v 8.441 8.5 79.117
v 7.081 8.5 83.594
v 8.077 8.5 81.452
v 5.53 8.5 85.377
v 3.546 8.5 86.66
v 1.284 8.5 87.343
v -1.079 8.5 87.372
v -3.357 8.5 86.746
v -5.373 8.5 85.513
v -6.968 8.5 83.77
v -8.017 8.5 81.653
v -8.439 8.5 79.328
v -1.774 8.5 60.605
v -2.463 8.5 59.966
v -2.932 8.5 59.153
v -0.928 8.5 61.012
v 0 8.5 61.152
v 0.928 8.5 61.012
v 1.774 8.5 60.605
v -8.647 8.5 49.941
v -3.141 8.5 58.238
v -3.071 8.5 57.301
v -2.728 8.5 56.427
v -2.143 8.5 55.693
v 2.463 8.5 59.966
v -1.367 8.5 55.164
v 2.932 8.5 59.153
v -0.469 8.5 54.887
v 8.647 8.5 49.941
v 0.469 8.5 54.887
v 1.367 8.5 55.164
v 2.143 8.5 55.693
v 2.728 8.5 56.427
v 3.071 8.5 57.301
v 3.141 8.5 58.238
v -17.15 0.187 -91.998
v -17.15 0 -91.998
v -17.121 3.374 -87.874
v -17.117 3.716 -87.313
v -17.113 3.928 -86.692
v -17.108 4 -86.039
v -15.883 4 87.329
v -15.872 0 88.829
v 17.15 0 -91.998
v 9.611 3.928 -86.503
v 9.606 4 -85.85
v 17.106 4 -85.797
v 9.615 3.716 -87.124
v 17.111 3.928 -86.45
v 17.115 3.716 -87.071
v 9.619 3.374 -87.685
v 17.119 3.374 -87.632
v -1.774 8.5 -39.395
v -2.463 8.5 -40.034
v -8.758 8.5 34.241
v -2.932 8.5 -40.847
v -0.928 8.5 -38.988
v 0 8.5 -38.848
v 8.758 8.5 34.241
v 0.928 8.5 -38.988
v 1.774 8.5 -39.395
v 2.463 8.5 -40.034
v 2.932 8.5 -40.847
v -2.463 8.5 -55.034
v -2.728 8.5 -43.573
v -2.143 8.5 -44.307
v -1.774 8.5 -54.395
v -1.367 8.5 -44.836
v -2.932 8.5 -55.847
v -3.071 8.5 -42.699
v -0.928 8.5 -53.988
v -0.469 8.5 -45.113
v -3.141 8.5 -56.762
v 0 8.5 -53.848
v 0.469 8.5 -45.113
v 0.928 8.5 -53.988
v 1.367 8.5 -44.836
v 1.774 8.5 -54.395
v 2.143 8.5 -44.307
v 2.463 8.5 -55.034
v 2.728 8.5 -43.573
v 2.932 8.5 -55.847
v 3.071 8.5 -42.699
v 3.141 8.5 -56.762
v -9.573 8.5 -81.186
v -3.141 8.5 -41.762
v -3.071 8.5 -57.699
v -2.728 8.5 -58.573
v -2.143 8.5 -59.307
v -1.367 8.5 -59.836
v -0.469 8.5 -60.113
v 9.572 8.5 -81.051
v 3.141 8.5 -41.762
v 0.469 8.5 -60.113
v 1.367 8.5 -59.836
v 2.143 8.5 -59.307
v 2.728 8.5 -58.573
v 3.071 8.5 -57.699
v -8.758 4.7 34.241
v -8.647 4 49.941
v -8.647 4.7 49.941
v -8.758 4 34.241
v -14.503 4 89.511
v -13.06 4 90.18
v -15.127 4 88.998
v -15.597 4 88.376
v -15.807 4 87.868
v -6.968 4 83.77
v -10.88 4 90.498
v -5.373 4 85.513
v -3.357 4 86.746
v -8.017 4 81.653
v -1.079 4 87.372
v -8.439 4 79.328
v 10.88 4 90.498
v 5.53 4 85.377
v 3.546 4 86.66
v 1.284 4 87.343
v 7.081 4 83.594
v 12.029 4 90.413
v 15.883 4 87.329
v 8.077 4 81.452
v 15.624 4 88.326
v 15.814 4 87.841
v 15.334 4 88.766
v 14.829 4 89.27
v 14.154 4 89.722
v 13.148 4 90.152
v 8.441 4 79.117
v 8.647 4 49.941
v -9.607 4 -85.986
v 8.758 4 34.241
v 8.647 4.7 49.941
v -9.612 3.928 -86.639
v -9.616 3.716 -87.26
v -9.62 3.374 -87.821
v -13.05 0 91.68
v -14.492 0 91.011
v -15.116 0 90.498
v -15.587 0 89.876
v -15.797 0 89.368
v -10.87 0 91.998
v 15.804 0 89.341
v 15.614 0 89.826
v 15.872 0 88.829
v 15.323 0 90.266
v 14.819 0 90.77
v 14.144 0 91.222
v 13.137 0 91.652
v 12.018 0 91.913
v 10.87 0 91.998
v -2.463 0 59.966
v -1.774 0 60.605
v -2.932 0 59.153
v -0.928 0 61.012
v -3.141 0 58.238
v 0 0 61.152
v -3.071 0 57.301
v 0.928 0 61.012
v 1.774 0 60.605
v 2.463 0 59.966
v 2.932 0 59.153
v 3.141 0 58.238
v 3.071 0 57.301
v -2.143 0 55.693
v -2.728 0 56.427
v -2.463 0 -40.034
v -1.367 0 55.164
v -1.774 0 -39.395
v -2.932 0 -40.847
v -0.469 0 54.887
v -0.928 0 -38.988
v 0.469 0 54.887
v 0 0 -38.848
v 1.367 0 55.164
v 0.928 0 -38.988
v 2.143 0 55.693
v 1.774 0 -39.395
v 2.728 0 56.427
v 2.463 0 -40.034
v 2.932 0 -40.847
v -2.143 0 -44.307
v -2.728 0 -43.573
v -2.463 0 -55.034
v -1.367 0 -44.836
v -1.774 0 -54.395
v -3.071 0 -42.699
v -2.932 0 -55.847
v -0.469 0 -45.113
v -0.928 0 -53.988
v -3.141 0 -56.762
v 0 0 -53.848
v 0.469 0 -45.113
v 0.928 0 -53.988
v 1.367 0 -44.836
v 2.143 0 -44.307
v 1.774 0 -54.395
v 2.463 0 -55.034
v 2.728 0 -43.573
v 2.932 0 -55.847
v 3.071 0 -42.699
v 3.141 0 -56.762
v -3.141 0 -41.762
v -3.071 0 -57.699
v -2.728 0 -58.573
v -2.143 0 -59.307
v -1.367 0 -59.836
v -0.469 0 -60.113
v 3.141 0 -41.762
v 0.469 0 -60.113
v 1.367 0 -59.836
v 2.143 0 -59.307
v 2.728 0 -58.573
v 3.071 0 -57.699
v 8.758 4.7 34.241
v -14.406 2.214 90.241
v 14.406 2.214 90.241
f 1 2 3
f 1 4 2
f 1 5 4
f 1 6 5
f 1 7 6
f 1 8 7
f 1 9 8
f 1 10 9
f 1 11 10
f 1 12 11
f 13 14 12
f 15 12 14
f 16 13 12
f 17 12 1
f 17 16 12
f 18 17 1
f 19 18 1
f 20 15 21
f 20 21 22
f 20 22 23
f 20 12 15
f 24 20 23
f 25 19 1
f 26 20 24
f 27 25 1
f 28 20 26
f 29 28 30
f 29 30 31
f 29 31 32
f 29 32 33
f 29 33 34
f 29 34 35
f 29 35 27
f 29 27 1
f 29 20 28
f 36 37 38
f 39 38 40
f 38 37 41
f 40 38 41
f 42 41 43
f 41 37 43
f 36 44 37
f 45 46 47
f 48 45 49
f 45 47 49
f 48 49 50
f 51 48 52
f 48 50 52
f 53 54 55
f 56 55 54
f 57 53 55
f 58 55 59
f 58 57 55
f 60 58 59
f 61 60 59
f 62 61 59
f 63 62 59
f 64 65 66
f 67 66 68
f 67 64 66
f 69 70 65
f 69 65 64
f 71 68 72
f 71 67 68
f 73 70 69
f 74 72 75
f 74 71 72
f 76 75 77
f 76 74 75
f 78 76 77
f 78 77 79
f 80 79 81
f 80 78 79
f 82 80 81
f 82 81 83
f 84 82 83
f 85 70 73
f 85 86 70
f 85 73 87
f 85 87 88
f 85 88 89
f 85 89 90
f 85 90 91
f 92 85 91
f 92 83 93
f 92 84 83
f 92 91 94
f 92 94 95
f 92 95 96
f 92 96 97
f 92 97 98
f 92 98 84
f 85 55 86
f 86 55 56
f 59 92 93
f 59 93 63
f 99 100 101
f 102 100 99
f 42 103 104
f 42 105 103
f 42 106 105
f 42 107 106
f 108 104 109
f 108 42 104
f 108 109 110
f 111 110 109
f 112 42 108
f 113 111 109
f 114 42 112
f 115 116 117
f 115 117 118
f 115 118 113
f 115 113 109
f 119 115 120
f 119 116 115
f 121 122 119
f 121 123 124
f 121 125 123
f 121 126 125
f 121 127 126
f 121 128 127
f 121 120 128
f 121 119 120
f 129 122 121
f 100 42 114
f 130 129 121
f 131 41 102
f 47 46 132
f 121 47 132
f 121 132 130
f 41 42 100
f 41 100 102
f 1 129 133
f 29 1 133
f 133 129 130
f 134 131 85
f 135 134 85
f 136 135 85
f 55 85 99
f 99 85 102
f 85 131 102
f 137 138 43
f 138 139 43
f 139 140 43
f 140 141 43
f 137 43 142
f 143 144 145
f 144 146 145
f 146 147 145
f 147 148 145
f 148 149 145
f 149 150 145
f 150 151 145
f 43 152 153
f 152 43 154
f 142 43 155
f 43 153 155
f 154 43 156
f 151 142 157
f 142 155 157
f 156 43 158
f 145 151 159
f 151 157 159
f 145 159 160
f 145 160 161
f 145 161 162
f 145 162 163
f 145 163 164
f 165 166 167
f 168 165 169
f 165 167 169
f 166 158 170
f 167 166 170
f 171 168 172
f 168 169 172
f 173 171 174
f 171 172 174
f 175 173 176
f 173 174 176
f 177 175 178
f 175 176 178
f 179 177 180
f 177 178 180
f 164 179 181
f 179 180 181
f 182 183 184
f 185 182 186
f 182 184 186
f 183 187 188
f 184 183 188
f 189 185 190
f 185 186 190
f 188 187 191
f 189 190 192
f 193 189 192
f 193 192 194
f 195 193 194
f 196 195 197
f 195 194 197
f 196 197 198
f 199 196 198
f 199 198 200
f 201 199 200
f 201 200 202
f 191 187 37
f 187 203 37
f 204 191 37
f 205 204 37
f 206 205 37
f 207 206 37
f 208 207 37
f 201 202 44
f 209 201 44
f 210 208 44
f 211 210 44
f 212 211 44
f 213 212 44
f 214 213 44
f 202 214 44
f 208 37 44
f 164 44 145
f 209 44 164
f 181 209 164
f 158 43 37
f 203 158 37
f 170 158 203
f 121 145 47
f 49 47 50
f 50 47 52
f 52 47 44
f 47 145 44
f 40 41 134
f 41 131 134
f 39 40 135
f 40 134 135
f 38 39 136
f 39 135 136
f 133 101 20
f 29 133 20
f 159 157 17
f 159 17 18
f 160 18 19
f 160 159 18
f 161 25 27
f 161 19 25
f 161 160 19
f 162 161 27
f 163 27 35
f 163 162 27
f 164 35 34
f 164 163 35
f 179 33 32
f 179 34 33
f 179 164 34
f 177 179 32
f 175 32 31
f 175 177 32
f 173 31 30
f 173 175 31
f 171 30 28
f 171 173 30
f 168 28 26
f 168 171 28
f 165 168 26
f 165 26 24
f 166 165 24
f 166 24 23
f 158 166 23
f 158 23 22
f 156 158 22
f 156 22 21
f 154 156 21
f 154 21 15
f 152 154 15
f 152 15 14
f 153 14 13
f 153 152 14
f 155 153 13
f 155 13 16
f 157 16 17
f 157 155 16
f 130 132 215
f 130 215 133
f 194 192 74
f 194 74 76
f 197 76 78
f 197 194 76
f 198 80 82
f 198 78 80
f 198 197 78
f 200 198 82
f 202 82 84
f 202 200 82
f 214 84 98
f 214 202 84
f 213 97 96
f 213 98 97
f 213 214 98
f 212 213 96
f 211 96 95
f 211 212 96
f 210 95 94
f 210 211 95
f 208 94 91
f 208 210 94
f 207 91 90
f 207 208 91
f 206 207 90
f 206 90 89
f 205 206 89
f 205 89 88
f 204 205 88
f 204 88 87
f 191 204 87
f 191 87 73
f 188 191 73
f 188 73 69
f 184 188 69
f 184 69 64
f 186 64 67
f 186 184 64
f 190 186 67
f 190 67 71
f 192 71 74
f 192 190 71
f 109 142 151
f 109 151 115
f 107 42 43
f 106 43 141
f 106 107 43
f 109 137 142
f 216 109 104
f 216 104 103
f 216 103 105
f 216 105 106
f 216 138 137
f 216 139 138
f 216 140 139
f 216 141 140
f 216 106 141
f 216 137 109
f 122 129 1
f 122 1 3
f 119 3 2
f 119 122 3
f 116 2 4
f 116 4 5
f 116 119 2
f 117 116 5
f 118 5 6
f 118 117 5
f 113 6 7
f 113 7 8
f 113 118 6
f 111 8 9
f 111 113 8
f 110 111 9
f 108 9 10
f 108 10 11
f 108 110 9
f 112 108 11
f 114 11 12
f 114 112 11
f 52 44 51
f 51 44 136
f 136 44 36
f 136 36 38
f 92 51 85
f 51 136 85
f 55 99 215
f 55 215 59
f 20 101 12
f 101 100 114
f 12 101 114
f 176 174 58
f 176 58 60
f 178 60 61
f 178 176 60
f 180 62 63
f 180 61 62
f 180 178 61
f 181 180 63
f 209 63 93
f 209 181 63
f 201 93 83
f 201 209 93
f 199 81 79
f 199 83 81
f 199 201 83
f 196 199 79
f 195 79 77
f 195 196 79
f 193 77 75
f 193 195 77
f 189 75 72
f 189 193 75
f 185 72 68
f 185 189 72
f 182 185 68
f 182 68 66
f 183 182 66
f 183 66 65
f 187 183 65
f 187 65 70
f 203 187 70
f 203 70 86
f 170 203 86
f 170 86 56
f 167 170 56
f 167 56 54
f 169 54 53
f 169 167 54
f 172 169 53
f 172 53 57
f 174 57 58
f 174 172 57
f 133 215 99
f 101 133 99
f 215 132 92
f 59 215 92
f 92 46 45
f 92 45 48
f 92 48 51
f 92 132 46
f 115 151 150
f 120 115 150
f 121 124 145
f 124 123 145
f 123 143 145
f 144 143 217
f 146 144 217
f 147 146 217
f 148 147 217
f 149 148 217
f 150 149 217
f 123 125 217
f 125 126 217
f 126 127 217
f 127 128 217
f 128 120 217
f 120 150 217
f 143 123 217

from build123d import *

# Parameters (mm, degrees)
BOSS_EXTRUDE1_DEPTH     = 4
BOSS_EXTRUDE2_DEPTH     = 4.5
CUT_EXTRUDE1_DEPTH      = 99.435547891
CUT_EXTRUDE1_DEPTH_BACK = 99.435547891
CUT_EXTRUDE2_START      = -4.5
CUT_EXTRUDE2_DEPTH      = 4.5
CUT_EXTRUDE3_DEPTH      = 95.023100537
CUT_EXTRUDE3_DEPTH_BACK = 95.023100537
CUT_EXTRUDE4_DEPTH      = 94.998158329
CUT_EXTRUDE4_DEPTH_BACK = 94.998158329
SKETCH6_W               = 15.7
SKETCH6_H               = 4.5
FILLET1_R               = 3
BOSS_EXTRUDE3_DEPTH     = 0.7
CUT_EXTRUDE5_DEPTH      = 94.967813764
CUT_EXTRUDE5_DEPTH_BACK = 94.967813764
SKETCH8_R               = 3.15


# Read off the part's stored shape, not the designer's step: Cut-Extrude2
with BuildPart() as part:
    # Sketch1 → Boss-Extrude1 (new body)
    with BuildSketch(Plane(origin=(0, 0, 0), x_dir=(1, 0, 0), z_dir=(0, 1, 0))):
        Polygon((-15.85, -91.997703776), (15.85, -91.997703776), (17.15, 91.997703776), (-17.15, 91.997703776), align=None)
    extrude(amount=BOSS_EXTRUDE1_DEPTH)

    # Sketch2 → Boss-Extrude2 (add)
    with BuildSketch(Plane(origin=(0, 4, 0), x_dir=(1, 0, 0), z_dir=(0, 1, 0))):
        Polygon((-8.349812803, -91.997703776), (8.349812803, -91.997703776), (9.649812803, 91.997703776), (-9.649812803, 91.997703776), align=None)
    extrude(amount=BOSS_EXTRUDE2_DEPTH)

    # Sketch3 → Cut-Extrude1 (cut, two sides: drawn at the far end of the back side and taken through both)
    with BuildSketch(Plane(origin=(16.499176365, 0, 0.116573177), x_dir=(0.007065217391304343, 0, -0.9999750410401319), z_dir=(0.999975041040132, 0, 0.0070652173913043435)).offset(-CUT_EXTRUDE1_DEPTH_BACK)):
        Polygon((92.116576087, 0), (81.116576087, 8.5), (92.116576087, 8.5), align=None)
    extrude(amount=CUT_EXTRUDE1_DEPTH + CUT_EXTRUDE1_DEPTH_BACK, mode=Mode.SUBTRACT)

    # Cut-Extrude2 outline → Cut-Extrude2 (cut)
    with BuildSketch(Plane(origin=(0, 8.5, 0), x_dir=(1, 0, 0), z_dir=(0, 1, 0)).offset(CUT_EXTRUDE2_START)):
        with BuildLine():
            ThreePointArc((8.440819946, -79.117014334), (0.10345841, -87.440771539), (-8.439329356, -79.327984806))
            Line((-8.439329356, -79.327984806), (-8.349812803, -91.997703776))
            Line((-8.349812803, -91.997703776), (8.349812803, -91.997703776))
            Line((8.349812803, -91.997703776), (8.440819946, -79.117014334))
        make_face()
    extrude(amount=CUT_EXTRUDE2_DEPTH, mode=Mode.SUBTRACT)

    # Sketch5 → Cut-Extrude3 (cut, two sides: drawn at the far end of the back side and taken through both)
    with BuildSketch(Plane(origin=(0, 0, 0.056470136), x_dir=(0, 0, -1), z_dir=(1, 0, 0)).offset(-CUT_EXTRUDE3_DEPTH_BACK)):
        Polygon((-91.941233639, 0), (-90.441233639, 4), (-91.941233639, 4), align=None)
    extrude(amount=CUT_EXTRUDE3_DEPTH + CUT_EXTRUDE3_DEPTH_BACK, mode=Mode.SUBTRACT)

    # Sketch6 → Cut-Extrude4 (cut, two sides: drawn at the far end of the back side and taken through both)
    with BuildSketch(Plane(origin=(0, 0, 0.030994299), x_dir=(0, 0, -1), z_dir=(1, 0, 0)).offset(-CUT_EXTRUDE4_DEPTH_BACK)):
        with Locations((-42.060436633, 6.25)):
            Rectangle(SKETCH6_W, SKETCH6_H)
    extrude(amount=CUT_EXTRUDE4_DEPTH + CUT_EXTRUDE4_DEPTH_BACK, mode=Mode.SUBTRACT)

    # Fillet1
    fillet1_edges = [part.edges().sort_by_distance(p)[0] for p in [
        (13.363520706, 4, -86.847856952),
        (-13.364854981, 4, -87.03670345),
    ]]
    fillet(fillet1_edges, radius=FILLET1_R)

    # Fillet3
    # an asymmetric fillet: 5, 3 mm, written as the material it takes off along each edge
    with BuildSketch(Plane(origin=(-15.891485902, 15.657877718, 86.125999632), x_dir=(-0.006615348832314233, -0.3511311249673921, -0.9363029265355098), z_dir=(0.002480817730747878, -0.9363262962659619, 0.3511223610997357))) as fillet3_piece_1:
        with BuildLine():
            Bezier((2.966988077, 0), (0, 0), (-0.032946278, 4.980153892), weights=[1, 0.709441812, 1])
            Line((-0.032946278, 4.980153892), (0, 0))
            Line((0, 0), (2.966988077, 0))
        make_face()
    extrude(amount=29.173329366, mode=Mode.SUBTRACT)
    with BuildSketch(Plane(origin=(15.819112189, -11.657877718, 96.36940792), x_dir=(-0.9999969227669587, 0.002322862025529483, -0.0008710732595747153), z_dir=(0.002480817730747878, 0.9363262962659619, -0.3511223610997357))) as fillet3_piece_2:
        with BuildLine():
            Bezier((4.98026287, 0), (0, 0), (-0.019627722, -2.966923154), weights=[1, 0.709441812, 1])
            Line((-0.019627722, -2.966923154), (0, 0))
            Line((0, 0), (4.98026287, 0))
        make_face()
    extrude(amount=29.173329366, mode=Mode.SUBTRACT)

    # Sketch7 → Boss-Extrude3 (add)
    with BuildSketch(Plane(origin=(0, 4, 0), x_dir=(1, 0, 0), z_dir=(0, 1, 0))):
        Polygon((-8.64695693, -49.941430932), (-8.757883612, -34.241430932), (8.757883612, -34.241430932), (8.64695693, -49.941430932), align=None)
    extrude(amount=BOSS_EXTRUDE3_DEPTH)

    # Sketch8 → Cut-Extrude5 (cut, two sides: drawn at the far end of the back side and taken through both)
    with BuildSketch(Plane(origin=(0, 8.5, 0), x_dir=(1, 0, 0), z_dir=(0, 1, 0)).offset(-CUT_EXTRUDE5_DEPTH_BACK)):
        with Locations(Location((0, -58.002296224, 0), (0, 0, 270))):
            Circle(SKETCH8_R)
        with Locations(Location((0, 56.997703776, 0), (0, 0, 270))):
            Circle(SKETCH8_R)
        with Locations(Location((0, 41.997703776, 0), (0, 0, 270))):
            Circle(SKETCH8_R)
    extrude(amount=CUT_EXTRUDE5_DEPTH + CUT_EXTRUDE5_DEPTH_BACK, mode=Mode.SUBTRACT)


solid = part.part
